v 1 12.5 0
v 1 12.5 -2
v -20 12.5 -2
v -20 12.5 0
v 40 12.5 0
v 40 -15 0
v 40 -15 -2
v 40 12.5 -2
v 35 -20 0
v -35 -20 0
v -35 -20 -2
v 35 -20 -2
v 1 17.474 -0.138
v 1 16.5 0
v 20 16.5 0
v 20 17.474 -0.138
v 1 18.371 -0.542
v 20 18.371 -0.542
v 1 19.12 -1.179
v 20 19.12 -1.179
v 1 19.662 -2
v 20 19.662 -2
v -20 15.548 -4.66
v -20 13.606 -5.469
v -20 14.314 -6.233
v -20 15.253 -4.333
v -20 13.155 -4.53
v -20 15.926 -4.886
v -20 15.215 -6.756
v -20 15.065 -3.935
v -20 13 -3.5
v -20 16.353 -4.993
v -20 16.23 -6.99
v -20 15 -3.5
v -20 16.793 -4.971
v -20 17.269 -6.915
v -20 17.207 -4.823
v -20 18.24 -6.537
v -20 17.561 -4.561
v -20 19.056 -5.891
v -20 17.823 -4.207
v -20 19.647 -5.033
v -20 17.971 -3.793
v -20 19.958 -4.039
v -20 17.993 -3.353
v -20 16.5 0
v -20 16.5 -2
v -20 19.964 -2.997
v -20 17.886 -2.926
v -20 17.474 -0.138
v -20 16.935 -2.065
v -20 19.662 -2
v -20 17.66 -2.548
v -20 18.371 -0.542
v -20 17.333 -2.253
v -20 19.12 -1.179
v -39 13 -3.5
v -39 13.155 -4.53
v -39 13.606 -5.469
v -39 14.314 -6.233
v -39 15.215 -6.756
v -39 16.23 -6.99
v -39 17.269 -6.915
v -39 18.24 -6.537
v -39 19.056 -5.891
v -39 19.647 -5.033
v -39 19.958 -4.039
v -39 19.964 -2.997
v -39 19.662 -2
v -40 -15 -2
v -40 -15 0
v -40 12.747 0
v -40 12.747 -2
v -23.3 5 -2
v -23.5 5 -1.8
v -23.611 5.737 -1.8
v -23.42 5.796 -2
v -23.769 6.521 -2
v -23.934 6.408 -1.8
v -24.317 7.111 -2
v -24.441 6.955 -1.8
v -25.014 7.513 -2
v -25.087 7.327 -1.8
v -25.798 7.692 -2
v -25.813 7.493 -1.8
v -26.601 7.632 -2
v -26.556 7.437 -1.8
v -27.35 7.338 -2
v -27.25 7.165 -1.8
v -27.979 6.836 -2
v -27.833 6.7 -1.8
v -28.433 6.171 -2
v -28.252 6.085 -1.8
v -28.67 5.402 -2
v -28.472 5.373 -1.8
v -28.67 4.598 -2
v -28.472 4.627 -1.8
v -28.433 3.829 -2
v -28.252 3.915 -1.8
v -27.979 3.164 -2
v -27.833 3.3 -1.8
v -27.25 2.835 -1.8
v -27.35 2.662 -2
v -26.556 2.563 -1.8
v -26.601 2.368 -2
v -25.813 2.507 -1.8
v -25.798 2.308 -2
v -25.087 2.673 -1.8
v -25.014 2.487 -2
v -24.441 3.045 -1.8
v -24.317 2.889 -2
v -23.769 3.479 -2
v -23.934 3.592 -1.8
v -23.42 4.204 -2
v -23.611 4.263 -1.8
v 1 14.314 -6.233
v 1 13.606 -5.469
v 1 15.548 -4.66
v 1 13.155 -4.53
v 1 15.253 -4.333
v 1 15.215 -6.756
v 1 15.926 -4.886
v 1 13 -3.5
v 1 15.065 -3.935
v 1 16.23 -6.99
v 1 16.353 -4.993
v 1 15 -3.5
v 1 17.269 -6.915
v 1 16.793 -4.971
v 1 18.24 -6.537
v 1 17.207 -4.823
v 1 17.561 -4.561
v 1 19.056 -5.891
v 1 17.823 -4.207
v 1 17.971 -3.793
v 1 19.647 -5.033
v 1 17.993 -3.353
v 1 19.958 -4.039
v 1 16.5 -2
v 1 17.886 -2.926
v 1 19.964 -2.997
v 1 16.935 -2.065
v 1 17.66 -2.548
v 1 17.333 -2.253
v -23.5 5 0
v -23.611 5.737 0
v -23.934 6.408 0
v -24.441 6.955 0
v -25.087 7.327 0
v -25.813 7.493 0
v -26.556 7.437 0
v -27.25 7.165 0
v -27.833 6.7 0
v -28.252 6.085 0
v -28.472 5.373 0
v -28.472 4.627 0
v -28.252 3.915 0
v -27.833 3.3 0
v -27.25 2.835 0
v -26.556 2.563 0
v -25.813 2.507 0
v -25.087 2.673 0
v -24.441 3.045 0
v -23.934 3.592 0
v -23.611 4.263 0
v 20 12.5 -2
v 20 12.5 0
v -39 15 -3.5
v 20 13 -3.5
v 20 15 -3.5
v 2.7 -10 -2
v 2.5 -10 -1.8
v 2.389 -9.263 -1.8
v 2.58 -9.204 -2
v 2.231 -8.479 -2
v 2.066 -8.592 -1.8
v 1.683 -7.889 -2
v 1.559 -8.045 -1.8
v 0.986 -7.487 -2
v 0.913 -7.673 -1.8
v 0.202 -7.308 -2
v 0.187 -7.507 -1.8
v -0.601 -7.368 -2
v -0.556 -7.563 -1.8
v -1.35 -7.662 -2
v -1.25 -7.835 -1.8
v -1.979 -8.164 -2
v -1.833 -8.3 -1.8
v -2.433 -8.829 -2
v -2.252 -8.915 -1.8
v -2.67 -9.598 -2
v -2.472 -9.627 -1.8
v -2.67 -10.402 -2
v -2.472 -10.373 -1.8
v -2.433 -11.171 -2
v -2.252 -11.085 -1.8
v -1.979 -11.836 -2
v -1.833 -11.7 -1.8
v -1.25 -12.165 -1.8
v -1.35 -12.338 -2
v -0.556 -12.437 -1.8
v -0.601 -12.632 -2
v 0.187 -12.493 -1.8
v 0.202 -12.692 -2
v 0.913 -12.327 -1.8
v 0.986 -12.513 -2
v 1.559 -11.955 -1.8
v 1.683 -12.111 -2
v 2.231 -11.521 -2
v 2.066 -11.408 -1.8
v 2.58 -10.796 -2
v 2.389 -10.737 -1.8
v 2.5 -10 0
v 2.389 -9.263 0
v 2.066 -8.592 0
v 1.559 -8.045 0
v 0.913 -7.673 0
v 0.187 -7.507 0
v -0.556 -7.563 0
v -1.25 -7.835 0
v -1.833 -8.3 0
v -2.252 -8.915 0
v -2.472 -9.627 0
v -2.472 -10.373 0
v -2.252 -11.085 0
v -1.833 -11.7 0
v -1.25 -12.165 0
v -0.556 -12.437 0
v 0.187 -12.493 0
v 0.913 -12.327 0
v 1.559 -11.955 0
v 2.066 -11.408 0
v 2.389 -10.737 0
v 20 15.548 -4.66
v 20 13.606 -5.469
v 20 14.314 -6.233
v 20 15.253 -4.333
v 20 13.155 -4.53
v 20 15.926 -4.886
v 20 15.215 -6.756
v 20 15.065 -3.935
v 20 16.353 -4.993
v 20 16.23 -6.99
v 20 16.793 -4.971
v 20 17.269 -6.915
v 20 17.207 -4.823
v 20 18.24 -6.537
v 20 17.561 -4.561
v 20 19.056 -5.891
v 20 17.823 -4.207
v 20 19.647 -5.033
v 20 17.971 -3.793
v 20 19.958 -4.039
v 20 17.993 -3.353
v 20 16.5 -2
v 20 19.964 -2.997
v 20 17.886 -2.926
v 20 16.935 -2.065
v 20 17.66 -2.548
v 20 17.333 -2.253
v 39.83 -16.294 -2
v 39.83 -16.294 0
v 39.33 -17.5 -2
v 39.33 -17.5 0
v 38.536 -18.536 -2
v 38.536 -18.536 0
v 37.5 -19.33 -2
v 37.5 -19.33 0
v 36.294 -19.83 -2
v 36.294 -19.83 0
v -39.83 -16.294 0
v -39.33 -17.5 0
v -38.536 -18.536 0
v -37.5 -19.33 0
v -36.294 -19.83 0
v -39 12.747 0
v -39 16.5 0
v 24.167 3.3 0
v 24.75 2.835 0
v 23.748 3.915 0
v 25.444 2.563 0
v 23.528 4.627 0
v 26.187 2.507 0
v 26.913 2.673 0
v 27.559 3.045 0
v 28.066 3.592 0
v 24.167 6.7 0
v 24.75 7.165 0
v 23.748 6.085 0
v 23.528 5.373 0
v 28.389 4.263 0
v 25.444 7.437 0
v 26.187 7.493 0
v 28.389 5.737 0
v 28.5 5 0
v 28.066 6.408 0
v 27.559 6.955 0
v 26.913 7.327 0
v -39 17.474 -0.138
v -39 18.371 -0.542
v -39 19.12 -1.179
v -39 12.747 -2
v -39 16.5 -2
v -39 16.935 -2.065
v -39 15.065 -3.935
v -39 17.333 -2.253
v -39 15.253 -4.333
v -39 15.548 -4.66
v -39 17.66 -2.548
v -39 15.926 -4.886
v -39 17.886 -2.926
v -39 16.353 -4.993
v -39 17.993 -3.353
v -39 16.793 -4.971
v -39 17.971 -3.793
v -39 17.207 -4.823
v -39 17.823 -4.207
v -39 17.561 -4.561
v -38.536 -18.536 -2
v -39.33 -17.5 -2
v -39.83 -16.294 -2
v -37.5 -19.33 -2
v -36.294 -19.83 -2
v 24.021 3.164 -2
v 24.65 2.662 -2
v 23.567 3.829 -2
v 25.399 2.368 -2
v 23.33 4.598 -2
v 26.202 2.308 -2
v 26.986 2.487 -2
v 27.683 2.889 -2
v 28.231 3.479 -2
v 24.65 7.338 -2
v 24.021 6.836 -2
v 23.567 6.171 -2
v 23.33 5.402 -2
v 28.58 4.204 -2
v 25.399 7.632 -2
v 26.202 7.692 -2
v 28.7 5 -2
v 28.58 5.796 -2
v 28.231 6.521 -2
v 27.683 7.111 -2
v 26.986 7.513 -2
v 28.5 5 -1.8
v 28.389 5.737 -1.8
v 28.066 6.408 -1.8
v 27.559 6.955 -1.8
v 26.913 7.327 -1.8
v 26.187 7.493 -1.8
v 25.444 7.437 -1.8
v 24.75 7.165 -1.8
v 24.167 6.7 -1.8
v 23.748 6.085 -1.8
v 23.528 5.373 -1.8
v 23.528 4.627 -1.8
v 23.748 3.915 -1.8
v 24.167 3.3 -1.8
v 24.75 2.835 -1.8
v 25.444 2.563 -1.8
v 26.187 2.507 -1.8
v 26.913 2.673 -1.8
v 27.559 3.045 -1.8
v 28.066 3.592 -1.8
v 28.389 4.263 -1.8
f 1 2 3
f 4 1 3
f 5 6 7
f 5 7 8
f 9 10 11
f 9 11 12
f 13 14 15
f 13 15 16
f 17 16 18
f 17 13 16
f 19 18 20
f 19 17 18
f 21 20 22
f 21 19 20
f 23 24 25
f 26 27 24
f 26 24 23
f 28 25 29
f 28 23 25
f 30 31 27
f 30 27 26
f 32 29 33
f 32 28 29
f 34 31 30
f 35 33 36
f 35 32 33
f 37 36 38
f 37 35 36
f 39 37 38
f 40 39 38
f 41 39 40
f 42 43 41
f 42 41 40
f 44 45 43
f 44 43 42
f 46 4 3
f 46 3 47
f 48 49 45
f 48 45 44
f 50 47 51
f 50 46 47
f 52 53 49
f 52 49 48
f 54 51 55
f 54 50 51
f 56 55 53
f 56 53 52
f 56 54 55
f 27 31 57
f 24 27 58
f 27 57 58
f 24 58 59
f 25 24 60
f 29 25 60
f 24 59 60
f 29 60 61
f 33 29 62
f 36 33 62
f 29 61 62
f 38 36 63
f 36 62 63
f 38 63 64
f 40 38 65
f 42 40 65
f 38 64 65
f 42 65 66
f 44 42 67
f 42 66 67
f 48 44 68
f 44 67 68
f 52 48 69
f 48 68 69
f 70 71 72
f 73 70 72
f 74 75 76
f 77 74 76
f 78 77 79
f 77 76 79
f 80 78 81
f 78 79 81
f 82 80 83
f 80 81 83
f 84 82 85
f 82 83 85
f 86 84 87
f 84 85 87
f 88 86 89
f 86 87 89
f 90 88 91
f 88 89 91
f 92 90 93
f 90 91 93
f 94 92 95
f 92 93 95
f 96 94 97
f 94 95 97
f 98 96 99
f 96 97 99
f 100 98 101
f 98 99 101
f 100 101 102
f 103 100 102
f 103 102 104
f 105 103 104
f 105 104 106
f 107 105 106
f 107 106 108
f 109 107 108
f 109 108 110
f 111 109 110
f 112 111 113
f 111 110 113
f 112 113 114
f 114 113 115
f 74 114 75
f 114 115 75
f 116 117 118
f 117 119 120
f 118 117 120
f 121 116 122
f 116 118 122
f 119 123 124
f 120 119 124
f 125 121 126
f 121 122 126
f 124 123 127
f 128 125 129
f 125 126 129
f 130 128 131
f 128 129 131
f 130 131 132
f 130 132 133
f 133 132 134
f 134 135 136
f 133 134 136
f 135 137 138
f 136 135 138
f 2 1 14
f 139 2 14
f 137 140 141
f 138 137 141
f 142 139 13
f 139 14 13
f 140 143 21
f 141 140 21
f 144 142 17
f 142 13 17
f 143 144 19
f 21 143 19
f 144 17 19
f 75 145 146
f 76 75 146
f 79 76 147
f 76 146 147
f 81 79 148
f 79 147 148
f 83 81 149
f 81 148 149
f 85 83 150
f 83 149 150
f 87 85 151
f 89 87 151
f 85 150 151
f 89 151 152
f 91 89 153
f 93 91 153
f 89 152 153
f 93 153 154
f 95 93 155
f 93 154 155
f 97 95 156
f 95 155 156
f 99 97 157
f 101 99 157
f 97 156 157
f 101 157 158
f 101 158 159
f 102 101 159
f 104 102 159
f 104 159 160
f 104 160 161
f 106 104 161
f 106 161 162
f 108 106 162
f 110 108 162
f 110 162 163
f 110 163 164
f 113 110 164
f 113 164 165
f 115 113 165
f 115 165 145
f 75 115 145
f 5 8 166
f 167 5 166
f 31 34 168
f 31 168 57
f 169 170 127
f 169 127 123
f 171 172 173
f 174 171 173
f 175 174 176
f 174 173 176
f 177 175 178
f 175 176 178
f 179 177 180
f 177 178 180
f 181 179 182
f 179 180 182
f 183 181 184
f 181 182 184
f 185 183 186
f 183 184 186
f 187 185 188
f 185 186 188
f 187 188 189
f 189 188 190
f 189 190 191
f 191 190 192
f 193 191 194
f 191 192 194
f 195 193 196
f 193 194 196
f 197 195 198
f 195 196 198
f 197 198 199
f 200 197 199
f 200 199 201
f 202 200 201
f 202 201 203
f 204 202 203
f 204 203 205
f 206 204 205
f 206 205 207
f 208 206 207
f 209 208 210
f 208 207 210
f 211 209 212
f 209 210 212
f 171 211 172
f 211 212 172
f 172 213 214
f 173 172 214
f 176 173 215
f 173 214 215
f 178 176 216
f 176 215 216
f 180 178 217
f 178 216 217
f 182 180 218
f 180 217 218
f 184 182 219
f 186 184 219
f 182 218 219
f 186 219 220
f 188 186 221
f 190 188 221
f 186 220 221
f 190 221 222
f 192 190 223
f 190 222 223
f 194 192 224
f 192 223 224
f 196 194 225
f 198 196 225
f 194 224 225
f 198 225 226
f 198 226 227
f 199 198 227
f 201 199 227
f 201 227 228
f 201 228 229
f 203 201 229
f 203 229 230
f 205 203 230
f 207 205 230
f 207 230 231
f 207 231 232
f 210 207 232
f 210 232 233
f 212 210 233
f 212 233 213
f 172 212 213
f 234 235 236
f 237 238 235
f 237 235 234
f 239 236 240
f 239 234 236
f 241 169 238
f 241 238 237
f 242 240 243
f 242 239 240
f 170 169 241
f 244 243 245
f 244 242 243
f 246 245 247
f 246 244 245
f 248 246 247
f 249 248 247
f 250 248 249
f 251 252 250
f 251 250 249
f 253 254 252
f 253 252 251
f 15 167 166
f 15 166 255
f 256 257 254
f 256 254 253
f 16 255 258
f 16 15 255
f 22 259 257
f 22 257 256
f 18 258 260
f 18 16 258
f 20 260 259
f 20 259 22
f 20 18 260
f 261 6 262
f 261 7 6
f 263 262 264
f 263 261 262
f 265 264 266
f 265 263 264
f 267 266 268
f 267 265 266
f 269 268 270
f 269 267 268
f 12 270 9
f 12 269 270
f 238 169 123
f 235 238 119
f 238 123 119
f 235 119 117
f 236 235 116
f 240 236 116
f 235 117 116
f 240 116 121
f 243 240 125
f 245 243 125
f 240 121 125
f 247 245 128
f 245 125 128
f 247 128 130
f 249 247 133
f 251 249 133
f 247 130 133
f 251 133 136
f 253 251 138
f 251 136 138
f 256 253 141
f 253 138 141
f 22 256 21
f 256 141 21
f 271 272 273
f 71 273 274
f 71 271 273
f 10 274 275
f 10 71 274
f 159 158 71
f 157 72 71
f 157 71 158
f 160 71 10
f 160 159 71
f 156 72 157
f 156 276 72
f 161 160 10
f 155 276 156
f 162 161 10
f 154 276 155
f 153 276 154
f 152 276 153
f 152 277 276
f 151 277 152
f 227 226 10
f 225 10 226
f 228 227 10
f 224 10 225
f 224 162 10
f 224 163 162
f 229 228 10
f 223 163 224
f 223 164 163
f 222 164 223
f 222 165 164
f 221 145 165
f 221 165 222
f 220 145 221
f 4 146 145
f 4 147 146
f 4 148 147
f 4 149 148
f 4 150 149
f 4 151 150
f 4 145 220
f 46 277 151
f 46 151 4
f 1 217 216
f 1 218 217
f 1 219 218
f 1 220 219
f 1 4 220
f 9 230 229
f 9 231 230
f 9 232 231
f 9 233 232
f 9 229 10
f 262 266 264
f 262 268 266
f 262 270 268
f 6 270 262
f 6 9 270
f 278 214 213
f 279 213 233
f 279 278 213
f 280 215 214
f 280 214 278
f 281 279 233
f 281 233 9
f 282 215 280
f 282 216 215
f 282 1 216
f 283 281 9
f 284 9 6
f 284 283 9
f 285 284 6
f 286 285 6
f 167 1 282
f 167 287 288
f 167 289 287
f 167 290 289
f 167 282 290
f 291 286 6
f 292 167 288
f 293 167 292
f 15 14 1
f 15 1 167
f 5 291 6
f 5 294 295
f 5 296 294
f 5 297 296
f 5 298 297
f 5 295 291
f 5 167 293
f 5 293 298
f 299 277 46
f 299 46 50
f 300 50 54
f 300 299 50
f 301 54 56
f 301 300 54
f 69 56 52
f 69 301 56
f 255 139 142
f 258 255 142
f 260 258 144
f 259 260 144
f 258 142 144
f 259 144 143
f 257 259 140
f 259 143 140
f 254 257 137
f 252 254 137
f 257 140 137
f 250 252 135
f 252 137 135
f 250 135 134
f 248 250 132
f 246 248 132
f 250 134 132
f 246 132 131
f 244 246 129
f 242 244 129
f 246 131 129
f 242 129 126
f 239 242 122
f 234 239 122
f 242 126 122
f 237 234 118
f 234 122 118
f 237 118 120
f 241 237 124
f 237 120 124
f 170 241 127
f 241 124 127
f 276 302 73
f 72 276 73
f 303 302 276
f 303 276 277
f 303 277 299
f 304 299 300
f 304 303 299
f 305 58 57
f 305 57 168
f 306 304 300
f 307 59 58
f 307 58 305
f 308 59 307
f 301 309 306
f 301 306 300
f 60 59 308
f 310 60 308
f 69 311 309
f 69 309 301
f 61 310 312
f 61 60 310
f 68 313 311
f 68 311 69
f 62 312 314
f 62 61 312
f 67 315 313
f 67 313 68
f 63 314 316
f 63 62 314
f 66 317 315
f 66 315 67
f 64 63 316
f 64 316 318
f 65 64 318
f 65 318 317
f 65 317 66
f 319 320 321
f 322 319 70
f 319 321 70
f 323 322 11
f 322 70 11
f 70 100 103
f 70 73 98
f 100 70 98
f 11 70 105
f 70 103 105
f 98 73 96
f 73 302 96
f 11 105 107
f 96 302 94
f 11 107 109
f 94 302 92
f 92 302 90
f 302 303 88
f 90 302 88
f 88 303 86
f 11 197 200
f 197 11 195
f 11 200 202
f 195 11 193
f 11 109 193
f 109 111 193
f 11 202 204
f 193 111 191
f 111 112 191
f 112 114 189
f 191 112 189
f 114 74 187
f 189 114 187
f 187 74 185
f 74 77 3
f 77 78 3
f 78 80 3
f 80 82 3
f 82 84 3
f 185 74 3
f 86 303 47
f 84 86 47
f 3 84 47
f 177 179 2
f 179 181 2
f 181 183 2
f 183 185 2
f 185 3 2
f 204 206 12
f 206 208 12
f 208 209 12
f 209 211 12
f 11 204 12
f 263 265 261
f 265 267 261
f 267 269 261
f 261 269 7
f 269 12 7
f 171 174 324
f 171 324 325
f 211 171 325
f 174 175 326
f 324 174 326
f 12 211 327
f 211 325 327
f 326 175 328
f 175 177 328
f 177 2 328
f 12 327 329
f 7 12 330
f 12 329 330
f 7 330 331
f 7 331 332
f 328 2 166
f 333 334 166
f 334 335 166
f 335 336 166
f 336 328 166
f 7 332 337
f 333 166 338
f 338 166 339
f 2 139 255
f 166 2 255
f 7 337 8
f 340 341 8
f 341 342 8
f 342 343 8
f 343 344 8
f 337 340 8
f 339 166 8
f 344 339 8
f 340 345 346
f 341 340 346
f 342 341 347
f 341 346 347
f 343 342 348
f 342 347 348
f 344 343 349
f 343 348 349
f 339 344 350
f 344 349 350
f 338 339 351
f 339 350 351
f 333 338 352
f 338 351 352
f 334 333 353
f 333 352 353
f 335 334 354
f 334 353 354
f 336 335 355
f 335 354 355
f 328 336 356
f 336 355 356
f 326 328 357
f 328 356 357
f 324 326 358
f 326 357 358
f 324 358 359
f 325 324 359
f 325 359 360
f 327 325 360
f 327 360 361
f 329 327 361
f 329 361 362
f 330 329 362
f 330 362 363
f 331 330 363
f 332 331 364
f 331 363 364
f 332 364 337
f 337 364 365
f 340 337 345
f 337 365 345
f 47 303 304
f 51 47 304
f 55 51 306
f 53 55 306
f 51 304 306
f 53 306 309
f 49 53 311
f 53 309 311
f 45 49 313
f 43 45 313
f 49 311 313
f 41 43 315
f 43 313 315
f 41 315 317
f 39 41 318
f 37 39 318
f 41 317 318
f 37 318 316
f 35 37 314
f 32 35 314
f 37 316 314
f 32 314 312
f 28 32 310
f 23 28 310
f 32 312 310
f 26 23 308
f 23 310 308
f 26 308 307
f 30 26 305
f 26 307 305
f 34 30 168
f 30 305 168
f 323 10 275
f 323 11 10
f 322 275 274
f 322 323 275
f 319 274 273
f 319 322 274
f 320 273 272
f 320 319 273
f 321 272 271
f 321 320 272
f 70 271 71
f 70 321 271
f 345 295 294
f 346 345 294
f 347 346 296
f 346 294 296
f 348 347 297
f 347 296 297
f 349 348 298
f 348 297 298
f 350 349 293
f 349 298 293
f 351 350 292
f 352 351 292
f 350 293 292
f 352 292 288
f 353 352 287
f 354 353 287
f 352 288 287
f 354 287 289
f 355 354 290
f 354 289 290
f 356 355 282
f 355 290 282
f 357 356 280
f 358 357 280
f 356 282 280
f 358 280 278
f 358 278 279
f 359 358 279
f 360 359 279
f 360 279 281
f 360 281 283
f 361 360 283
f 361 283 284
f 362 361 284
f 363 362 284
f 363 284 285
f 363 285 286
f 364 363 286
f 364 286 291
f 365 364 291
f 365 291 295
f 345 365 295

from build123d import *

# Parameters (mm, degrees)
SKETCH2_W             = 80
SKETCH2_H             = 40
BASE_FLANGE1_DEPTH    = 2
HEM1_START            = -40
HEM1_DEPTH            = 21
HEM1_2_DEPTH          = 1
HEM1_START_2          = -20
HEM1_3_DEPTH          = 1
HEM1_START_3          = -39
HEM1_4_DEPTH          = 19
HEM3_DEPTH            = 21
HEM3_2_DEPTH          = 1
HEM3_START            = 20
HEM3_3_DEPTH          = 1
HEM3_START_2          = 1
HEM3_4_DEPTH          = 19
CUT_EXTRUDE1_REACH    = 47
SKETCH13_W            = 1
SKETCH13_H            = 2.753292139
FILLET1_R             = 5
F_5_0MM_DOWEL_HOLE1_D = 5
CHAMFER1_SIZE         = 0.2


# Read off the part's stored shape, not the designer's step: Hem1, Hem3
# Sheet-metal steps are written as plain solids
with BuildPart() as part:
    # Sketch2 → Base-Flange1 (new body)
    with BuildSketch(Plane.XY):
        Rectangle(SKETCH2_W, SKETCH2_H)
    extrude(amount=-BASE_FLANGE1_DEPTH)

    # Hem1 outline → Hem1 (cut)
    with BuildSketch(Plane.YZ.offset(HEM1_START)):
        with BuildLine():
            Line((20, 0), (16.5, 0))
            ThreePointArc((16.5, 0), (18.370828693, -0.541960108), (19.66227766, -2))
            Line((19.66227766, -2), (20, -2))
            Line((20, -2), (20, 0))
        make_face()
    extrude(amount=HEM1_DEPTH, mode=Mode.SUBTRACT)

    # Hem1 2 outline → Hem1 2 (cut)
    with BuildSketch(Plane.YZ.offset(HEM1_START)):
        with BuildLine():
            Line((15.5, 0), (15.5, -2))
            Line((15.5, -2), (19.66227766, -2))
            ThreePointArc((19.66227766, -2), (18.370828693, -0.541960108), (16.5, 0))
            Line((16.5, 0), (15.5, 0))
        make_face()
    extrude(amount=HEM1_2_DEPTH, mode=Mode.SUBTRACT)

    # Hem1 3 outline → Hem1 3 (cut)
    with BuildSketch(Plane.YZ.offset(HEM1_START_2)):
        with BuildLine():
            Line((15.5, 0), (15.5, -2))
            Line((15.5, -2), (19.66227766, -2))
            ThreePointArc((19.66227766, -2), (18.370828693, -0.541960108), (16.5, 0))
            Line((16.5, 0), (15.5, 0))
        make_face()
    extrude(amount=HEM1_3_DEPTH, mode=Mode.SUBTRACT)

    # Hem1 4 outline → Hem1 4 (add)
    with BuildSketch(Plane.YZ.offset(HEM1_START_3)):
        with BuildLine():
            Line((19.66227766, -2), (16.5, -2))
            ThreePointArc((16.5, -2), (17.560660172, -4.560660172), (15, -3.5))
            Line((15, -3.5), (13, -3.5))
            ThreePointArc((13, -3.5), (17.268774411, -6.914525722), (19.66227766, -2))
        make_face()
    extrude(amount=HEM1_4_DEPTH)

    # Hem3 outline → Hem3 (cut)
    with BuildSketch(Plane.YZ):
        with BuildLine():
            Line((20, 0), (16.5, 0))
            ThreePointArc((16.5, 0), (18.370828693, -0.541960108), (19.66227766, -2))
            Line((19.66227766, -2), (20, -2))
            Line((20, -2), (20, 0))
        make_face()
    extrude(amount=HEM3_DEPTH, mode=Mode.SUBTRACT)

    # Hem3 2 outline → Hem3 2 (cut)
    with BuildSketch(Plane.YZ):
        with BuildLine():
            Line((15.5, 0), (15.5, -2))
            Line((15.5, -2), (19.66227766, -2))
            ThreePointArc((19.66227766, -2), (18.370828693, -0.541960108), (16.5, 0))
            Line((16.5, 0), (15.5, 0))
        make_face()
    extrude(amount=HEM3_2_DEPTH, mode=Mode.SUBTRACT)

    # Hem3 3 outline → Hem3 3 (cut)
    with BuildSketch(Plane.YZ.offset(HEM3_START)):
        with BuildLine():
            Line((15.5, 0), (15.5, -2))
            Line((15.5, -2), (19.66227766, -2))
            ThreePointArc((19.66227766, -2), (18.370828693, -0.541960108), (16.5, 0))
            Line((16.5, 0), (15.5, 0))
        make_face()
    extrude(amount=HEM3_3_DEPTH, mode=Mode.SUBTRACT)

    # Hem3 4 outline → Hem3 4 (add)
    with BuildSketch(Plane.YZ.offset(HEM3_START_2)):
        with BuildLine():
            Line((19.66227766, -2), (16.5, -2))
            ThreePointArc((16.5, -2), (17.560660172, -4.560660172), (15, -3.5))
            Line((15, -3.5), (13, -3.5))
            ThreePointArc((13, -3.5), (17.268774411, -6.914525722), (19.66227766, -2))
        make_face()
    extrude(amount=HEM3_4_DEPTH)

    # Sketch13 → Cut-Extrude1 (cut, up to next)
    with BuildSketch(Plane(origin=(0, 0, -2), x_dir=(-1, 0, 0), z_dir=(0, 0, -1)), mode=Mode.PRIVATE) as cut_extrude1_sk1:
        Polygon((-21, 12.5), (-40, 12.5), (-40, 20), (-21, 20), (-21, 15.5), (-20, 15.5), (-20, 12.5), align=None)
    cut_extrude1_tool1 = extrude(cut_extrude1_sk1.sketch, amount=-CUT_EXTRUDE1_REACH, mode=Mode.PRIVATE) & part.part
    # Sketch13 → Cut-Extrude1 (cut, up to next)
    with BuildSketch(Plane(origin=(0, 0, -2), x_dir=(-1, 0, 0), z_dir=(0, 0, -1)), mode=Mode.PRIVATE) as cut_extrude1_sk2:
        Polygon((19, 12.5), (0, 12.5), (-1, 12.5), (-1, 15.5), (0, 15.5), (0, 20), (19, 20), (19, 15.5), (20, 15.5), (20, 12.5), align=None)
    cut_extrude1_tool2 = extrude(cut_extrude1_sk2.sketch, amount=-CUT_EXTRUDE1_REACH, mode=Mode.PRIVATE) & part.part
    # Sketch13 → Cut-Extrude1 (cut, up to next)
    with BuildSketch(Plane(origin=(0, 0, -2), x_dir=(-1, 0, 0), z_dir=(0, 0, -1)), mode=Mode.PRIVATE) as cut_extrude1_sk3:
        with Locations((39.5, 14.123353931)):
            Rectangle(SKETCH13_W, SKETCH13_H)
    cut_extrude1_tool3 = extrude(cut_extrude1_sk3.sketch, amount=-CUT_EXTRUDE1_REACH, mode=Mode.PRIVATE) & part.part
    add(cut_extrude1_tool1.solids().sort_by_distance((30.293814, 16.203608, -2))[0], mode=Mode.SUBTRACT)
    add(cut_extrude1_tool2.solids().sort_by_distance((-9.5, 16.159091, -2))[0], mode=Mode.SUBTRACT)
    add(cut_extrude1_tool3.solids().sort_by_distance((-39.5, 14.123354, -2))[0], mode=Mode.SUBTRACT)

    # Fillet1
    fillet1_edges = [part.edges().sort_by_distance(p)[0] for p in [
        (40, -20, -1),
        (-40, -20, -1),
    ]]
    fillet(fillet1_edges, radius=FILLET1_R)

    # Ø5.0mm Dowel Hole1 (through all)
    with Locations(Plane(origin=(0, 0, -2), x_dir=(-1, 0, 0), z_dir=(0, 0, -1))):
        with Locations((-26, 5), (26, 5), (0, -10)):
            Hole(F_5_0MM_DOWEL_HOLE1_D / 2)

    # Chamfer1
    chamfer1_edges = [part.edges().sort_by_distance(p)[0] for p in [
        (-2.5, -10, -2),
        (-28.5, 5, -2),
        (23.5, 5, -2),
    ]]
    chamfer(chamfer1_edges, length=CHAMFER1_SIZE)


solid = part.part
